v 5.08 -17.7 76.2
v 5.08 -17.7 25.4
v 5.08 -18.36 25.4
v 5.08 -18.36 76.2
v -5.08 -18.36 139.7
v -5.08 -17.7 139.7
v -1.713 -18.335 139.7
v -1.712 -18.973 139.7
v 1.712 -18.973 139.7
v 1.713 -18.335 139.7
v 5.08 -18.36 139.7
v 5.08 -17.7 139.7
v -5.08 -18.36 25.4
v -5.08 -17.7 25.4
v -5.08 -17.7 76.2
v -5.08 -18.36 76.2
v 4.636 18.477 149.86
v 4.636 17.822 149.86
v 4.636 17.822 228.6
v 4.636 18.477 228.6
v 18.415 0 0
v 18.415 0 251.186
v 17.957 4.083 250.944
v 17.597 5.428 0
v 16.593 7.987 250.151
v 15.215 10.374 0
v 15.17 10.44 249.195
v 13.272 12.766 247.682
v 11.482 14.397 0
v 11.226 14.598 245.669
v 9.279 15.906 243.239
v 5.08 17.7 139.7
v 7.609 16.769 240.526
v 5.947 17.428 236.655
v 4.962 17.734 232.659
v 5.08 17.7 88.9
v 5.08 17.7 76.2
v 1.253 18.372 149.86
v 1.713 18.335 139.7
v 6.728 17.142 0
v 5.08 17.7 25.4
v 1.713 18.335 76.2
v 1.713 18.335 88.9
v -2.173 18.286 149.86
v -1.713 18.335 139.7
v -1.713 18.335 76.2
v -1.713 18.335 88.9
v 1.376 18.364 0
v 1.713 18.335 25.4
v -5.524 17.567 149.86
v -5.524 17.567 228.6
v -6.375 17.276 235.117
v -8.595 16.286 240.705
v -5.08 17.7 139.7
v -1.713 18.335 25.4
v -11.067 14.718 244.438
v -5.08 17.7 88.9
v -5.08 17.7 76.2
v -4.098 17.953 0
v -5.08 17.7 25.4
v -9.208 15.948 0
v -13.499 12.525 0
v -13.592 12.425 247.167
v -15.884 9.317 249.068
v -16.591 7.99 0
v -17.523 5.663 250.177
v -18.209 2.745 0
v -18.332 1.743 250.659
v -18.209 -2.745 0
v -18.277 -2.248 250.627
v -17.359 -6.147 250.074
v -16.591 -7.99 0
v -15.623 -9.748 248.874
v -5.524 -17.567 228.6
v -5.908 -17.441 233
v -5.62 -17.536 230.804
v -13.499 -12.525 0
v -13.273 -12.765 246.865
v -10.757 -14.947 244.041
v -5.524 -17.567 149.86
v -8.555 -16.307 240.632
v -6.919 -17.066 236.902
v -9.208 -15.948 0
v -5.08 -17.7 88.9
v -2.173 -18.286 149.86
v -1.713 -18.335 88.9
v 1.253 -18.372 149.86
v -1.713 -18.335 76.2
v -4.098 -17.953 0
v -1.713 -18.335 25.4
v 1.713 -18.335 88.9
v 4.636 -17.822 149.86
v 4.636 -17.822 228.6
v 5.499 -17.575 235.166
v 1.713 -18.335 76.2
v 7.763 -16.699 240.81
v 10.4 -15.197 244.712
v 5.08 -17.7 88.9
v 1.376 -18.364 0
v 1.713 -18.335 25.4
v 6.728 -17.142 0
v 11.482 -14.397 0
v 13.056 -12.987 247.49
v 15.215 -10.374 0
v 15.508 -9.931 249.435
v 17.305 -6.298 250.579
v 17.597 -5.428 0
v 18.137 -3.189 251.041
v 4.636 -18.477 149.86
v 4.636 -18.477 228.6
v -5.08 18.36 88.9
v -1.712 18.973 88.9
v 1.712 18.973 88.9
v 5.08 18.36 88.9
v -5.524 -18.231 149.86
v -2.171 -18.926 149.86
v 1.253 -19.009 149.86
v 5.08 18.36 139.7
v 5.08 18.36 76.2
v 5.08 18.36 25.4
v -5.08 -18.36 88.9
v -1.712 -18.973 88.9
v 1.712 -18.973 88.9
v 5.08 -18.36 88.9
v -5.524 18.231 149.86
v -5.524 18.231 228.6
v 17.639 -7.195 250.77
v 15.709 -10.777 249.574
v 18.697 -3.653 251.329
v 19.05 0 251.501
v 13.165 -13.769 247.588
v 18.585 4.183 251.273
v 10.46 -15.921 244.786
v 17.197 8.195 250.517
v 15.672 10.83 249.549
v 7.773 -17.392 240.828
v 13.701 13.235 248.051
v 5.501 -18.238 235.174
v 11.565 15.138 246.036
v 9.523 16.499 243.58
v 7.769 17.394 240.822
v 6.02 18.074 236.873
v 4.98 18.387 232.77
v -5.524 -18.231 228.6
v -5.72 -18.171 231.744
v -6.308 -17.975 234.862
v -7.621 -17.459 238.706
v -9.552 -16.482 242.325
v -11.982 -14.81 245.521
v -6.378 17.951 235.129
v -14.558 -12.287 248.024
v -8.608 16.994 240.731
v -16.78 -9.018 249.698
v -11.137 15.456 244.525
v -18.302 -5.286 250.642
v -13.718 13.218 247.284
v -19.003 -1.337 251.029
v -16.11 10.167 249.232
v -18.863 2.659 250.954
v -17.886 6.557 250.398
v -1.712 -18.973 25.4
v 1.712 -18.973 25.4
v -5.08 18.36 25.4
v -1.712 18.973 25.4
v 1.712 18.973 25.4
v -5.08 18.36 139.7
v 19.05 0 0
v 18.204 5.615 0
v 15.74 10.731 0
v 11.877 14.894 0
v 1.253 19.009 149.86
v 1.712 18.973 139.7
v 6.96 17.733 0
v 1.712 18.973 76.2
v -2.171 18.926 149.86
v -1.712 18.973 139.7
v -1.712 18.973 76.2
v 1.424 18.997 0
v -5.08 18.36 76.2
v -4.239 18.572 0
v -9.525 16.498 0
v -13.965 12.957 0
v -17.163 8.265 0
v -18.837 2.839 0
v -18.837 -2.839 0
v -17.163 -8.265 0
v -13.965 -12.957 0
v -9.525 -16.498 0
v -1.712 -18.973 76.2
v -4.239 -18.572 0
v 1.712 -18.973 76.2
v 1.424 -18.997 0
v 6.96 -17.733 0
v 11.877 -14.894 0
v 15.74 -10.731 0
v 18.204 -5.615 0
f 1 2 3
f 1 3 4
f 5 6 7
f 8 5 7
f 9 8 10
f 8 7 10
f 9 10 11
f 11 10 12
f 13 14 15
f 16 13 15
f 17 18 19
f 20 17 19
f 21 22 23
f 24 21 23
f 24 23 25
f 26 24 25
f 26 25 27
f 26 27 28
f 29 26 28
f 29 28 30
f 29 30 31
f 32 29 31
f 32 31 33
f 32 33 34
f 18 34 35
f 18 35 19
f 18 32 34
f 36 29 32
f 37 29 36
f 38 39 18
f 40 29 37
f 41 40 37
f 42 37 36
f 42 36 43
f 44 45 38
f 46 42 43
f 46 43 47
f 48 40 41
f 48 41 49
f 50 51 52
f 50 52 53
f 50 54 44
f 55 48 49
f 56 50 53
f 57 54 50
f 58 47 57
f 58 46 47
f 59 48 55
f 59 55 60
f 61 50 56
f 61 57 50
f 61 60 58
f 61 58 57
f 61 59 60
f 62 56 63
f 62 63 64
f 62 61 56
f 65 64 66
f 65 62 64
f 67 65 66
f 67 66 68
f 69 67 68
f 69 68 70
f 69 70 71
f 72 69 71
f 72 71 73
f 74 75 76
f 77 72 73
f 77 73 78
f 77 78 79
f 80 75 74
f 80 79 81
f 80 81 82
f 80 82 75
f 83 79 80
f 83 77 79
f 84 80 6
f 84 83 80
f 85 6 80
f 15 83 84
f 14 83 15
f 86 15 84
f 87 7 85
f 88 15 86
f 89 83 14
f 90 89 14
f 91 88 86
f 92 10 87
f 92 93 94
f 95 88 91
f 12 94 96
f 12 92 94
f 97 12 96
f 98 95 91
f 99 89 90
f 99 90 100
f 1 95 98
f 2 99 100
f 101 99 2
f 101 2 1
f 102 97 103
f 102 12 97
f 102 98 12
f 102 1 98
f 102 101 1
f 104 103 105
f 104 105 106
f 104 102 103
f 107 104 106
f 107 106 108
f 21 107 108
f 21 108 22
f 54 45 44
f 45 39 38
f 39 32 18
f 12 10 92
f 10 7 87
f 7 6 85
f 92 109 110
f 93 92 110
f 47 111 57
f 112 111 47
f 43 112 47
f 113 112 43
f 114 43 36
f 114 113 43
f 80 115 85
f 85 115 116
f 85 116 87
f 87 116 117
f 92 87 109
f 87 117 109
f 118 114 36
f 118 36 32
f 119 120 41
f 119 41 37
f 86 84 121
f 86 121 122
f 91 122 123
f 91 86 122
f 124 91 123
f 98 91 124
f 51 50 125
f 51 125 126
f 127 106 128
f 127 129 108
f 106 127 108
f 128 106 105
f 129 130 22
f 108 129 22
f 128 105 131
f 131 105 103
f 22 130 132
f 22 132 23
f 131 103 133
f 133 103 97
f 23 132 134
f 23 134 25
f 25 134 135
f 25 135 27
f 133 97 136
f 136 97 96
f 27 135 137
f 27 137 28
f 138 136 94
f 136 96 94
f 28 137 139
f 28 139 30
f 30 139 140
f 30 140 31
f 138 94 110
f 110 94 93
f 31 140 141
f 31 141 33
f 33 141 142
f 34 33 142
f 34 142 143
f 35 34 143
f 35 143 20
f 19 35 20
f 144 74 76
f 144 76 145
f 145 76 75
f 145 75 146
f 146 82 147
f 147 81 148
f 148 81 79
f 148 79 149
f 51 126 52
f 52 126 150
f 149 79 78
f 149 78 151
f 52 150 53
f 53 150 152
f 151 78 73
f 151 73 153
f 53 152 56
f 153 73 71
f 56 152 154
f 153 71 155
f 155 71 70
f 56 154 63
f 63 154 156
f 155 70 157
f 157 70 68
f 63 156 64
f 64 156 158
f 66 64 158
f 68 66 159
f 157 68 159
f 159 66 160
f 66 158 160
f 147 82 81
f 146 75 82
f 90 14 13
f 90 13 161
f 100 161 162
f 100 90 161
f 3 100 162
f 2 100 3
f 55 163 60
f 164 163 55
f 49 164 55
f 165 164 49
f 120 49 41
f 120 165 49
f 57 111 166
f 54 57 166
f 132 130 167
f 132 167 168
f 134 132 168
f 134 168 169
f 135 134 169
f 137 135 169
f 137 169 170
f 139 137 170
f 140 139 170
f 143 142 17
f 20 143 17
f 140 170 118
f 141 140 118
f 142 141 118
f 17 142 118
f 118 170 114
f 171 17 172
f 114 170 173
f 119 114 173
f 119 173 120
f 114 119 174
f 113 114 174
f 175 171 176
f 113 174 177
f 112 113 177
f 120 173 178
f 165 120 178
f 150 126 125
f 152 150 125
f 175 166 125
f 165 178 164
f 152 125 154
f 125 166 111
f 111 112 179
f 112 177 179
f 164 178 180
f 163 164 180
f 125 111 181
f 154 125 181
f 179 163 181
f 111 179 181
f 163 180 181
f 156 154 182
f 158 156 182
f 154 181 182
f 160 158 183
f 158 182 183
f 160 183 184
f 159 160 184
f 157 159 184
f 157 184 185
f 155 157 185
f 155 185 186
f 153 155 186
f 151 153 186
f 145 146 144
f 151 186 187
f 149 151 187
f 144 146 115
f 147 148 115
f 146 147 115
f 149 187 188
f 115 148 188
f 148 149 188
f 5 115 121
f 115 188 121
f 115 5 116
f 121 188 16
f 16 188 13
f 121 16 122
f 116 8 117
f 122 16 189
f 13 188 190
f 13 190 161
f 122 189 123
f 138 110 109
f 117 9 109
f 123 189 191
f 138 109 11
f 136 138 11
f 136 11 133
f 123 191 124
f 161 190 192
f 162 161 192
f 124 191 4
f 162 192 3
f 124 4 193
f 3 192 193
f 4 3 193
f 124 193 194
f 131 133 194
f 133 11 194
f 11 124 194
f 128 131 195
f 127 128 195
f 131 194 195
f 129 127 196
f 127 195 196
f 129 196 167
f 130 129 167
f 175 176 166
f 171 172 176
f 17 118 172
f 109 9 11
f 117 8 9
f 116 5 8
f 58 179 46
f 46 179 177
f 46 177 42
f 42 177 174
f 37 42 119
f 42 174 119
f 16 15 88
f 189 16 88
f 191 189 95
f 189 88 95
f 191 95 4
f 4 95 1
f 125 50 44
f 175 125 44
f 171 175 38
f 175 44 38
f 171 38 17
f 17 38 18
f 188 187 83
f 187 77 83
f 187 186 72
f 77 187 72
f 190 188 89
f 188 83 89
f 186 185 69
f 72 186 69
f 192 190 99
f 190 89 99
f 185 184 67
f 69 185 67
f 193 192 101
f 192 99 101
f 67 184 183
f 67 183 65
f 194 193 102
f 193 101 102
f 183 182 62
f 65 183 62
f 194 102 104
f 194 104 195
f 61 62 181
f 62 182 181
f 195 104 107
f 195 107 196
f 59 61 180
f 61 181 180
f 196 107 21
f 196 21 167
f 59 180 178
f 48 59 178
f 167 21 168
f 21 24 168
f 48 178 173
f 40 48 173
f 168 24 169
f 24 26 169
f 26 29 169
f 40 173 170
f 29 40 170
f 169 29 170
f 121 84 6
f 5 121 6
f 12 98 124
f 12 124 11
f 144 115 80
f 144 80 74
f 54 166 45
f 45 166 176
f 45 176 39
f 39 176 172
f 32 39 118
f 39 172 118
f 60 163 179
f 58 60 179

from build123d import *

# Parameters (mm, degrees)
F0_R        = 19.05
F1_DEPTH    = 254
F2_T        = -0.635
F3_W        = 10.16
F3_H        = 50.8
F3_H_2      = 127
F4_DEPTH    = 38.1
F5_T1_DEPTH = 127.6645661416
F5_T3_DEPTH = 127.6553906563
F5_T5_DEPTH = 127.6553906563
F5_T7_DEPTH = 127.6645661416


# Not quite as in the source:
# - a fillet or chamfer that OpenCascade refuses, or shapes differently, is made with other operations: its cross-section is extruded or revolved along the edge and cut away or added


with BuildPart() as f1:
    # F0 (on Top) → F1 (new body)
    with BuildSketch(Plane.XY):
        Circle(F0_R)
    extrude(amount=F1_DEPTH)

    # F2
    f2_openings = [f1.faces().sort_by_distance(p)[0] for p in [
        (0, 0, 0),
        (0, 0, 254),
    ]]
    offset(amount=F2_T, openings=f2_openings)

    # F3 (on Front) → F4 (cut, symmetric)
    with BuildSketch(Plane.XZ):
        with Locations((0, 50.8)):
            Rectangle(F3_W, F3_H)
        with Locations((-3.17e-08, 114.3)):
            Rectangle(F3_W, F3_H)
        with Locations((-0.4444076066, 213.36)):
            Rectangle(F3_W, F3_H_2)
    extrude(amount=F4_DEPTH, both=True, mode=Mode.SUBTRACT)

    # F5: fillet of radius 25.4 on 4 edges, made by hand

    # F5_s2 → F5_t1 (cut)
    with BuildSketch(Plane.XZ.offset(-45.9331805498)):
        with BuildLine():
            ThreePointArc((-5.5244076066, 228.6), (-12.9638953644, 246.5605122421), (-30.9244076066, 254))
            Line((-30.9244076066, 254), (-5.5244076066, 254))
            Line((-5.5244076066, 254), (-5.5244076066, 228.6))
        make_face()
    extrude(amount=F5_T1_DEPTH, mode=Mode.SUBTRACT)

    # F5_s4 → F5_t3 (cut)
    with BuildSketch(Plane.XZ.offset(-45.6780049332)):
        with BuildLine():
            ThreePointArc((30.0355923934, 254), (12.0750801513, 246.5605122421), (4.6355923934, 228.6))
            Line((4.6355923934, 228.6), (4.6355923934, 254))
            Line((4.6355923934, 254), (30.0355923934, 254))
        make_face()
    extrude(amount=F5_T3_DEPTH, mode=Mode.SUBTRACT)

    # F5_s6 → F5_t5 (cut)
    with BuildSketch(Plane.XZ.offset(-81.9773857231)):
        with BuildLine():
            ThreePointArc((30.0355923934, 254), (12.0750801513, 246.5605122421), (4.6355923934, 228.6))
            Line((4.6355923934, 228.6), (4.6355923934, 254))
            Line((4.6355923934, 254), (30.0355923934, 254))
        make_face()
    extrude(amount=F5_T5_DEPTH, mode=Mode.SUBTRACT)

    # F5_s8 → F5_t7 (cut)
    with BuildSketch(Plane.XZ.offset(-81.7313855918)):
        with BuildLine():
            ThreePointArc((-30.9244076066, 254), (-12.9638953644, 246.5605122421), (-5.5244076066, 228.6))
            Line((-5.5244076066, 228.6), (-5.5244076066, 254))
            Line((-5.5244076066, 254), (-30.9244076066, 254))
        make_face()
    extrude(amount=F5_T7_DEPTH, mode=Mode.SUBTRACT)


solid = f1.part
